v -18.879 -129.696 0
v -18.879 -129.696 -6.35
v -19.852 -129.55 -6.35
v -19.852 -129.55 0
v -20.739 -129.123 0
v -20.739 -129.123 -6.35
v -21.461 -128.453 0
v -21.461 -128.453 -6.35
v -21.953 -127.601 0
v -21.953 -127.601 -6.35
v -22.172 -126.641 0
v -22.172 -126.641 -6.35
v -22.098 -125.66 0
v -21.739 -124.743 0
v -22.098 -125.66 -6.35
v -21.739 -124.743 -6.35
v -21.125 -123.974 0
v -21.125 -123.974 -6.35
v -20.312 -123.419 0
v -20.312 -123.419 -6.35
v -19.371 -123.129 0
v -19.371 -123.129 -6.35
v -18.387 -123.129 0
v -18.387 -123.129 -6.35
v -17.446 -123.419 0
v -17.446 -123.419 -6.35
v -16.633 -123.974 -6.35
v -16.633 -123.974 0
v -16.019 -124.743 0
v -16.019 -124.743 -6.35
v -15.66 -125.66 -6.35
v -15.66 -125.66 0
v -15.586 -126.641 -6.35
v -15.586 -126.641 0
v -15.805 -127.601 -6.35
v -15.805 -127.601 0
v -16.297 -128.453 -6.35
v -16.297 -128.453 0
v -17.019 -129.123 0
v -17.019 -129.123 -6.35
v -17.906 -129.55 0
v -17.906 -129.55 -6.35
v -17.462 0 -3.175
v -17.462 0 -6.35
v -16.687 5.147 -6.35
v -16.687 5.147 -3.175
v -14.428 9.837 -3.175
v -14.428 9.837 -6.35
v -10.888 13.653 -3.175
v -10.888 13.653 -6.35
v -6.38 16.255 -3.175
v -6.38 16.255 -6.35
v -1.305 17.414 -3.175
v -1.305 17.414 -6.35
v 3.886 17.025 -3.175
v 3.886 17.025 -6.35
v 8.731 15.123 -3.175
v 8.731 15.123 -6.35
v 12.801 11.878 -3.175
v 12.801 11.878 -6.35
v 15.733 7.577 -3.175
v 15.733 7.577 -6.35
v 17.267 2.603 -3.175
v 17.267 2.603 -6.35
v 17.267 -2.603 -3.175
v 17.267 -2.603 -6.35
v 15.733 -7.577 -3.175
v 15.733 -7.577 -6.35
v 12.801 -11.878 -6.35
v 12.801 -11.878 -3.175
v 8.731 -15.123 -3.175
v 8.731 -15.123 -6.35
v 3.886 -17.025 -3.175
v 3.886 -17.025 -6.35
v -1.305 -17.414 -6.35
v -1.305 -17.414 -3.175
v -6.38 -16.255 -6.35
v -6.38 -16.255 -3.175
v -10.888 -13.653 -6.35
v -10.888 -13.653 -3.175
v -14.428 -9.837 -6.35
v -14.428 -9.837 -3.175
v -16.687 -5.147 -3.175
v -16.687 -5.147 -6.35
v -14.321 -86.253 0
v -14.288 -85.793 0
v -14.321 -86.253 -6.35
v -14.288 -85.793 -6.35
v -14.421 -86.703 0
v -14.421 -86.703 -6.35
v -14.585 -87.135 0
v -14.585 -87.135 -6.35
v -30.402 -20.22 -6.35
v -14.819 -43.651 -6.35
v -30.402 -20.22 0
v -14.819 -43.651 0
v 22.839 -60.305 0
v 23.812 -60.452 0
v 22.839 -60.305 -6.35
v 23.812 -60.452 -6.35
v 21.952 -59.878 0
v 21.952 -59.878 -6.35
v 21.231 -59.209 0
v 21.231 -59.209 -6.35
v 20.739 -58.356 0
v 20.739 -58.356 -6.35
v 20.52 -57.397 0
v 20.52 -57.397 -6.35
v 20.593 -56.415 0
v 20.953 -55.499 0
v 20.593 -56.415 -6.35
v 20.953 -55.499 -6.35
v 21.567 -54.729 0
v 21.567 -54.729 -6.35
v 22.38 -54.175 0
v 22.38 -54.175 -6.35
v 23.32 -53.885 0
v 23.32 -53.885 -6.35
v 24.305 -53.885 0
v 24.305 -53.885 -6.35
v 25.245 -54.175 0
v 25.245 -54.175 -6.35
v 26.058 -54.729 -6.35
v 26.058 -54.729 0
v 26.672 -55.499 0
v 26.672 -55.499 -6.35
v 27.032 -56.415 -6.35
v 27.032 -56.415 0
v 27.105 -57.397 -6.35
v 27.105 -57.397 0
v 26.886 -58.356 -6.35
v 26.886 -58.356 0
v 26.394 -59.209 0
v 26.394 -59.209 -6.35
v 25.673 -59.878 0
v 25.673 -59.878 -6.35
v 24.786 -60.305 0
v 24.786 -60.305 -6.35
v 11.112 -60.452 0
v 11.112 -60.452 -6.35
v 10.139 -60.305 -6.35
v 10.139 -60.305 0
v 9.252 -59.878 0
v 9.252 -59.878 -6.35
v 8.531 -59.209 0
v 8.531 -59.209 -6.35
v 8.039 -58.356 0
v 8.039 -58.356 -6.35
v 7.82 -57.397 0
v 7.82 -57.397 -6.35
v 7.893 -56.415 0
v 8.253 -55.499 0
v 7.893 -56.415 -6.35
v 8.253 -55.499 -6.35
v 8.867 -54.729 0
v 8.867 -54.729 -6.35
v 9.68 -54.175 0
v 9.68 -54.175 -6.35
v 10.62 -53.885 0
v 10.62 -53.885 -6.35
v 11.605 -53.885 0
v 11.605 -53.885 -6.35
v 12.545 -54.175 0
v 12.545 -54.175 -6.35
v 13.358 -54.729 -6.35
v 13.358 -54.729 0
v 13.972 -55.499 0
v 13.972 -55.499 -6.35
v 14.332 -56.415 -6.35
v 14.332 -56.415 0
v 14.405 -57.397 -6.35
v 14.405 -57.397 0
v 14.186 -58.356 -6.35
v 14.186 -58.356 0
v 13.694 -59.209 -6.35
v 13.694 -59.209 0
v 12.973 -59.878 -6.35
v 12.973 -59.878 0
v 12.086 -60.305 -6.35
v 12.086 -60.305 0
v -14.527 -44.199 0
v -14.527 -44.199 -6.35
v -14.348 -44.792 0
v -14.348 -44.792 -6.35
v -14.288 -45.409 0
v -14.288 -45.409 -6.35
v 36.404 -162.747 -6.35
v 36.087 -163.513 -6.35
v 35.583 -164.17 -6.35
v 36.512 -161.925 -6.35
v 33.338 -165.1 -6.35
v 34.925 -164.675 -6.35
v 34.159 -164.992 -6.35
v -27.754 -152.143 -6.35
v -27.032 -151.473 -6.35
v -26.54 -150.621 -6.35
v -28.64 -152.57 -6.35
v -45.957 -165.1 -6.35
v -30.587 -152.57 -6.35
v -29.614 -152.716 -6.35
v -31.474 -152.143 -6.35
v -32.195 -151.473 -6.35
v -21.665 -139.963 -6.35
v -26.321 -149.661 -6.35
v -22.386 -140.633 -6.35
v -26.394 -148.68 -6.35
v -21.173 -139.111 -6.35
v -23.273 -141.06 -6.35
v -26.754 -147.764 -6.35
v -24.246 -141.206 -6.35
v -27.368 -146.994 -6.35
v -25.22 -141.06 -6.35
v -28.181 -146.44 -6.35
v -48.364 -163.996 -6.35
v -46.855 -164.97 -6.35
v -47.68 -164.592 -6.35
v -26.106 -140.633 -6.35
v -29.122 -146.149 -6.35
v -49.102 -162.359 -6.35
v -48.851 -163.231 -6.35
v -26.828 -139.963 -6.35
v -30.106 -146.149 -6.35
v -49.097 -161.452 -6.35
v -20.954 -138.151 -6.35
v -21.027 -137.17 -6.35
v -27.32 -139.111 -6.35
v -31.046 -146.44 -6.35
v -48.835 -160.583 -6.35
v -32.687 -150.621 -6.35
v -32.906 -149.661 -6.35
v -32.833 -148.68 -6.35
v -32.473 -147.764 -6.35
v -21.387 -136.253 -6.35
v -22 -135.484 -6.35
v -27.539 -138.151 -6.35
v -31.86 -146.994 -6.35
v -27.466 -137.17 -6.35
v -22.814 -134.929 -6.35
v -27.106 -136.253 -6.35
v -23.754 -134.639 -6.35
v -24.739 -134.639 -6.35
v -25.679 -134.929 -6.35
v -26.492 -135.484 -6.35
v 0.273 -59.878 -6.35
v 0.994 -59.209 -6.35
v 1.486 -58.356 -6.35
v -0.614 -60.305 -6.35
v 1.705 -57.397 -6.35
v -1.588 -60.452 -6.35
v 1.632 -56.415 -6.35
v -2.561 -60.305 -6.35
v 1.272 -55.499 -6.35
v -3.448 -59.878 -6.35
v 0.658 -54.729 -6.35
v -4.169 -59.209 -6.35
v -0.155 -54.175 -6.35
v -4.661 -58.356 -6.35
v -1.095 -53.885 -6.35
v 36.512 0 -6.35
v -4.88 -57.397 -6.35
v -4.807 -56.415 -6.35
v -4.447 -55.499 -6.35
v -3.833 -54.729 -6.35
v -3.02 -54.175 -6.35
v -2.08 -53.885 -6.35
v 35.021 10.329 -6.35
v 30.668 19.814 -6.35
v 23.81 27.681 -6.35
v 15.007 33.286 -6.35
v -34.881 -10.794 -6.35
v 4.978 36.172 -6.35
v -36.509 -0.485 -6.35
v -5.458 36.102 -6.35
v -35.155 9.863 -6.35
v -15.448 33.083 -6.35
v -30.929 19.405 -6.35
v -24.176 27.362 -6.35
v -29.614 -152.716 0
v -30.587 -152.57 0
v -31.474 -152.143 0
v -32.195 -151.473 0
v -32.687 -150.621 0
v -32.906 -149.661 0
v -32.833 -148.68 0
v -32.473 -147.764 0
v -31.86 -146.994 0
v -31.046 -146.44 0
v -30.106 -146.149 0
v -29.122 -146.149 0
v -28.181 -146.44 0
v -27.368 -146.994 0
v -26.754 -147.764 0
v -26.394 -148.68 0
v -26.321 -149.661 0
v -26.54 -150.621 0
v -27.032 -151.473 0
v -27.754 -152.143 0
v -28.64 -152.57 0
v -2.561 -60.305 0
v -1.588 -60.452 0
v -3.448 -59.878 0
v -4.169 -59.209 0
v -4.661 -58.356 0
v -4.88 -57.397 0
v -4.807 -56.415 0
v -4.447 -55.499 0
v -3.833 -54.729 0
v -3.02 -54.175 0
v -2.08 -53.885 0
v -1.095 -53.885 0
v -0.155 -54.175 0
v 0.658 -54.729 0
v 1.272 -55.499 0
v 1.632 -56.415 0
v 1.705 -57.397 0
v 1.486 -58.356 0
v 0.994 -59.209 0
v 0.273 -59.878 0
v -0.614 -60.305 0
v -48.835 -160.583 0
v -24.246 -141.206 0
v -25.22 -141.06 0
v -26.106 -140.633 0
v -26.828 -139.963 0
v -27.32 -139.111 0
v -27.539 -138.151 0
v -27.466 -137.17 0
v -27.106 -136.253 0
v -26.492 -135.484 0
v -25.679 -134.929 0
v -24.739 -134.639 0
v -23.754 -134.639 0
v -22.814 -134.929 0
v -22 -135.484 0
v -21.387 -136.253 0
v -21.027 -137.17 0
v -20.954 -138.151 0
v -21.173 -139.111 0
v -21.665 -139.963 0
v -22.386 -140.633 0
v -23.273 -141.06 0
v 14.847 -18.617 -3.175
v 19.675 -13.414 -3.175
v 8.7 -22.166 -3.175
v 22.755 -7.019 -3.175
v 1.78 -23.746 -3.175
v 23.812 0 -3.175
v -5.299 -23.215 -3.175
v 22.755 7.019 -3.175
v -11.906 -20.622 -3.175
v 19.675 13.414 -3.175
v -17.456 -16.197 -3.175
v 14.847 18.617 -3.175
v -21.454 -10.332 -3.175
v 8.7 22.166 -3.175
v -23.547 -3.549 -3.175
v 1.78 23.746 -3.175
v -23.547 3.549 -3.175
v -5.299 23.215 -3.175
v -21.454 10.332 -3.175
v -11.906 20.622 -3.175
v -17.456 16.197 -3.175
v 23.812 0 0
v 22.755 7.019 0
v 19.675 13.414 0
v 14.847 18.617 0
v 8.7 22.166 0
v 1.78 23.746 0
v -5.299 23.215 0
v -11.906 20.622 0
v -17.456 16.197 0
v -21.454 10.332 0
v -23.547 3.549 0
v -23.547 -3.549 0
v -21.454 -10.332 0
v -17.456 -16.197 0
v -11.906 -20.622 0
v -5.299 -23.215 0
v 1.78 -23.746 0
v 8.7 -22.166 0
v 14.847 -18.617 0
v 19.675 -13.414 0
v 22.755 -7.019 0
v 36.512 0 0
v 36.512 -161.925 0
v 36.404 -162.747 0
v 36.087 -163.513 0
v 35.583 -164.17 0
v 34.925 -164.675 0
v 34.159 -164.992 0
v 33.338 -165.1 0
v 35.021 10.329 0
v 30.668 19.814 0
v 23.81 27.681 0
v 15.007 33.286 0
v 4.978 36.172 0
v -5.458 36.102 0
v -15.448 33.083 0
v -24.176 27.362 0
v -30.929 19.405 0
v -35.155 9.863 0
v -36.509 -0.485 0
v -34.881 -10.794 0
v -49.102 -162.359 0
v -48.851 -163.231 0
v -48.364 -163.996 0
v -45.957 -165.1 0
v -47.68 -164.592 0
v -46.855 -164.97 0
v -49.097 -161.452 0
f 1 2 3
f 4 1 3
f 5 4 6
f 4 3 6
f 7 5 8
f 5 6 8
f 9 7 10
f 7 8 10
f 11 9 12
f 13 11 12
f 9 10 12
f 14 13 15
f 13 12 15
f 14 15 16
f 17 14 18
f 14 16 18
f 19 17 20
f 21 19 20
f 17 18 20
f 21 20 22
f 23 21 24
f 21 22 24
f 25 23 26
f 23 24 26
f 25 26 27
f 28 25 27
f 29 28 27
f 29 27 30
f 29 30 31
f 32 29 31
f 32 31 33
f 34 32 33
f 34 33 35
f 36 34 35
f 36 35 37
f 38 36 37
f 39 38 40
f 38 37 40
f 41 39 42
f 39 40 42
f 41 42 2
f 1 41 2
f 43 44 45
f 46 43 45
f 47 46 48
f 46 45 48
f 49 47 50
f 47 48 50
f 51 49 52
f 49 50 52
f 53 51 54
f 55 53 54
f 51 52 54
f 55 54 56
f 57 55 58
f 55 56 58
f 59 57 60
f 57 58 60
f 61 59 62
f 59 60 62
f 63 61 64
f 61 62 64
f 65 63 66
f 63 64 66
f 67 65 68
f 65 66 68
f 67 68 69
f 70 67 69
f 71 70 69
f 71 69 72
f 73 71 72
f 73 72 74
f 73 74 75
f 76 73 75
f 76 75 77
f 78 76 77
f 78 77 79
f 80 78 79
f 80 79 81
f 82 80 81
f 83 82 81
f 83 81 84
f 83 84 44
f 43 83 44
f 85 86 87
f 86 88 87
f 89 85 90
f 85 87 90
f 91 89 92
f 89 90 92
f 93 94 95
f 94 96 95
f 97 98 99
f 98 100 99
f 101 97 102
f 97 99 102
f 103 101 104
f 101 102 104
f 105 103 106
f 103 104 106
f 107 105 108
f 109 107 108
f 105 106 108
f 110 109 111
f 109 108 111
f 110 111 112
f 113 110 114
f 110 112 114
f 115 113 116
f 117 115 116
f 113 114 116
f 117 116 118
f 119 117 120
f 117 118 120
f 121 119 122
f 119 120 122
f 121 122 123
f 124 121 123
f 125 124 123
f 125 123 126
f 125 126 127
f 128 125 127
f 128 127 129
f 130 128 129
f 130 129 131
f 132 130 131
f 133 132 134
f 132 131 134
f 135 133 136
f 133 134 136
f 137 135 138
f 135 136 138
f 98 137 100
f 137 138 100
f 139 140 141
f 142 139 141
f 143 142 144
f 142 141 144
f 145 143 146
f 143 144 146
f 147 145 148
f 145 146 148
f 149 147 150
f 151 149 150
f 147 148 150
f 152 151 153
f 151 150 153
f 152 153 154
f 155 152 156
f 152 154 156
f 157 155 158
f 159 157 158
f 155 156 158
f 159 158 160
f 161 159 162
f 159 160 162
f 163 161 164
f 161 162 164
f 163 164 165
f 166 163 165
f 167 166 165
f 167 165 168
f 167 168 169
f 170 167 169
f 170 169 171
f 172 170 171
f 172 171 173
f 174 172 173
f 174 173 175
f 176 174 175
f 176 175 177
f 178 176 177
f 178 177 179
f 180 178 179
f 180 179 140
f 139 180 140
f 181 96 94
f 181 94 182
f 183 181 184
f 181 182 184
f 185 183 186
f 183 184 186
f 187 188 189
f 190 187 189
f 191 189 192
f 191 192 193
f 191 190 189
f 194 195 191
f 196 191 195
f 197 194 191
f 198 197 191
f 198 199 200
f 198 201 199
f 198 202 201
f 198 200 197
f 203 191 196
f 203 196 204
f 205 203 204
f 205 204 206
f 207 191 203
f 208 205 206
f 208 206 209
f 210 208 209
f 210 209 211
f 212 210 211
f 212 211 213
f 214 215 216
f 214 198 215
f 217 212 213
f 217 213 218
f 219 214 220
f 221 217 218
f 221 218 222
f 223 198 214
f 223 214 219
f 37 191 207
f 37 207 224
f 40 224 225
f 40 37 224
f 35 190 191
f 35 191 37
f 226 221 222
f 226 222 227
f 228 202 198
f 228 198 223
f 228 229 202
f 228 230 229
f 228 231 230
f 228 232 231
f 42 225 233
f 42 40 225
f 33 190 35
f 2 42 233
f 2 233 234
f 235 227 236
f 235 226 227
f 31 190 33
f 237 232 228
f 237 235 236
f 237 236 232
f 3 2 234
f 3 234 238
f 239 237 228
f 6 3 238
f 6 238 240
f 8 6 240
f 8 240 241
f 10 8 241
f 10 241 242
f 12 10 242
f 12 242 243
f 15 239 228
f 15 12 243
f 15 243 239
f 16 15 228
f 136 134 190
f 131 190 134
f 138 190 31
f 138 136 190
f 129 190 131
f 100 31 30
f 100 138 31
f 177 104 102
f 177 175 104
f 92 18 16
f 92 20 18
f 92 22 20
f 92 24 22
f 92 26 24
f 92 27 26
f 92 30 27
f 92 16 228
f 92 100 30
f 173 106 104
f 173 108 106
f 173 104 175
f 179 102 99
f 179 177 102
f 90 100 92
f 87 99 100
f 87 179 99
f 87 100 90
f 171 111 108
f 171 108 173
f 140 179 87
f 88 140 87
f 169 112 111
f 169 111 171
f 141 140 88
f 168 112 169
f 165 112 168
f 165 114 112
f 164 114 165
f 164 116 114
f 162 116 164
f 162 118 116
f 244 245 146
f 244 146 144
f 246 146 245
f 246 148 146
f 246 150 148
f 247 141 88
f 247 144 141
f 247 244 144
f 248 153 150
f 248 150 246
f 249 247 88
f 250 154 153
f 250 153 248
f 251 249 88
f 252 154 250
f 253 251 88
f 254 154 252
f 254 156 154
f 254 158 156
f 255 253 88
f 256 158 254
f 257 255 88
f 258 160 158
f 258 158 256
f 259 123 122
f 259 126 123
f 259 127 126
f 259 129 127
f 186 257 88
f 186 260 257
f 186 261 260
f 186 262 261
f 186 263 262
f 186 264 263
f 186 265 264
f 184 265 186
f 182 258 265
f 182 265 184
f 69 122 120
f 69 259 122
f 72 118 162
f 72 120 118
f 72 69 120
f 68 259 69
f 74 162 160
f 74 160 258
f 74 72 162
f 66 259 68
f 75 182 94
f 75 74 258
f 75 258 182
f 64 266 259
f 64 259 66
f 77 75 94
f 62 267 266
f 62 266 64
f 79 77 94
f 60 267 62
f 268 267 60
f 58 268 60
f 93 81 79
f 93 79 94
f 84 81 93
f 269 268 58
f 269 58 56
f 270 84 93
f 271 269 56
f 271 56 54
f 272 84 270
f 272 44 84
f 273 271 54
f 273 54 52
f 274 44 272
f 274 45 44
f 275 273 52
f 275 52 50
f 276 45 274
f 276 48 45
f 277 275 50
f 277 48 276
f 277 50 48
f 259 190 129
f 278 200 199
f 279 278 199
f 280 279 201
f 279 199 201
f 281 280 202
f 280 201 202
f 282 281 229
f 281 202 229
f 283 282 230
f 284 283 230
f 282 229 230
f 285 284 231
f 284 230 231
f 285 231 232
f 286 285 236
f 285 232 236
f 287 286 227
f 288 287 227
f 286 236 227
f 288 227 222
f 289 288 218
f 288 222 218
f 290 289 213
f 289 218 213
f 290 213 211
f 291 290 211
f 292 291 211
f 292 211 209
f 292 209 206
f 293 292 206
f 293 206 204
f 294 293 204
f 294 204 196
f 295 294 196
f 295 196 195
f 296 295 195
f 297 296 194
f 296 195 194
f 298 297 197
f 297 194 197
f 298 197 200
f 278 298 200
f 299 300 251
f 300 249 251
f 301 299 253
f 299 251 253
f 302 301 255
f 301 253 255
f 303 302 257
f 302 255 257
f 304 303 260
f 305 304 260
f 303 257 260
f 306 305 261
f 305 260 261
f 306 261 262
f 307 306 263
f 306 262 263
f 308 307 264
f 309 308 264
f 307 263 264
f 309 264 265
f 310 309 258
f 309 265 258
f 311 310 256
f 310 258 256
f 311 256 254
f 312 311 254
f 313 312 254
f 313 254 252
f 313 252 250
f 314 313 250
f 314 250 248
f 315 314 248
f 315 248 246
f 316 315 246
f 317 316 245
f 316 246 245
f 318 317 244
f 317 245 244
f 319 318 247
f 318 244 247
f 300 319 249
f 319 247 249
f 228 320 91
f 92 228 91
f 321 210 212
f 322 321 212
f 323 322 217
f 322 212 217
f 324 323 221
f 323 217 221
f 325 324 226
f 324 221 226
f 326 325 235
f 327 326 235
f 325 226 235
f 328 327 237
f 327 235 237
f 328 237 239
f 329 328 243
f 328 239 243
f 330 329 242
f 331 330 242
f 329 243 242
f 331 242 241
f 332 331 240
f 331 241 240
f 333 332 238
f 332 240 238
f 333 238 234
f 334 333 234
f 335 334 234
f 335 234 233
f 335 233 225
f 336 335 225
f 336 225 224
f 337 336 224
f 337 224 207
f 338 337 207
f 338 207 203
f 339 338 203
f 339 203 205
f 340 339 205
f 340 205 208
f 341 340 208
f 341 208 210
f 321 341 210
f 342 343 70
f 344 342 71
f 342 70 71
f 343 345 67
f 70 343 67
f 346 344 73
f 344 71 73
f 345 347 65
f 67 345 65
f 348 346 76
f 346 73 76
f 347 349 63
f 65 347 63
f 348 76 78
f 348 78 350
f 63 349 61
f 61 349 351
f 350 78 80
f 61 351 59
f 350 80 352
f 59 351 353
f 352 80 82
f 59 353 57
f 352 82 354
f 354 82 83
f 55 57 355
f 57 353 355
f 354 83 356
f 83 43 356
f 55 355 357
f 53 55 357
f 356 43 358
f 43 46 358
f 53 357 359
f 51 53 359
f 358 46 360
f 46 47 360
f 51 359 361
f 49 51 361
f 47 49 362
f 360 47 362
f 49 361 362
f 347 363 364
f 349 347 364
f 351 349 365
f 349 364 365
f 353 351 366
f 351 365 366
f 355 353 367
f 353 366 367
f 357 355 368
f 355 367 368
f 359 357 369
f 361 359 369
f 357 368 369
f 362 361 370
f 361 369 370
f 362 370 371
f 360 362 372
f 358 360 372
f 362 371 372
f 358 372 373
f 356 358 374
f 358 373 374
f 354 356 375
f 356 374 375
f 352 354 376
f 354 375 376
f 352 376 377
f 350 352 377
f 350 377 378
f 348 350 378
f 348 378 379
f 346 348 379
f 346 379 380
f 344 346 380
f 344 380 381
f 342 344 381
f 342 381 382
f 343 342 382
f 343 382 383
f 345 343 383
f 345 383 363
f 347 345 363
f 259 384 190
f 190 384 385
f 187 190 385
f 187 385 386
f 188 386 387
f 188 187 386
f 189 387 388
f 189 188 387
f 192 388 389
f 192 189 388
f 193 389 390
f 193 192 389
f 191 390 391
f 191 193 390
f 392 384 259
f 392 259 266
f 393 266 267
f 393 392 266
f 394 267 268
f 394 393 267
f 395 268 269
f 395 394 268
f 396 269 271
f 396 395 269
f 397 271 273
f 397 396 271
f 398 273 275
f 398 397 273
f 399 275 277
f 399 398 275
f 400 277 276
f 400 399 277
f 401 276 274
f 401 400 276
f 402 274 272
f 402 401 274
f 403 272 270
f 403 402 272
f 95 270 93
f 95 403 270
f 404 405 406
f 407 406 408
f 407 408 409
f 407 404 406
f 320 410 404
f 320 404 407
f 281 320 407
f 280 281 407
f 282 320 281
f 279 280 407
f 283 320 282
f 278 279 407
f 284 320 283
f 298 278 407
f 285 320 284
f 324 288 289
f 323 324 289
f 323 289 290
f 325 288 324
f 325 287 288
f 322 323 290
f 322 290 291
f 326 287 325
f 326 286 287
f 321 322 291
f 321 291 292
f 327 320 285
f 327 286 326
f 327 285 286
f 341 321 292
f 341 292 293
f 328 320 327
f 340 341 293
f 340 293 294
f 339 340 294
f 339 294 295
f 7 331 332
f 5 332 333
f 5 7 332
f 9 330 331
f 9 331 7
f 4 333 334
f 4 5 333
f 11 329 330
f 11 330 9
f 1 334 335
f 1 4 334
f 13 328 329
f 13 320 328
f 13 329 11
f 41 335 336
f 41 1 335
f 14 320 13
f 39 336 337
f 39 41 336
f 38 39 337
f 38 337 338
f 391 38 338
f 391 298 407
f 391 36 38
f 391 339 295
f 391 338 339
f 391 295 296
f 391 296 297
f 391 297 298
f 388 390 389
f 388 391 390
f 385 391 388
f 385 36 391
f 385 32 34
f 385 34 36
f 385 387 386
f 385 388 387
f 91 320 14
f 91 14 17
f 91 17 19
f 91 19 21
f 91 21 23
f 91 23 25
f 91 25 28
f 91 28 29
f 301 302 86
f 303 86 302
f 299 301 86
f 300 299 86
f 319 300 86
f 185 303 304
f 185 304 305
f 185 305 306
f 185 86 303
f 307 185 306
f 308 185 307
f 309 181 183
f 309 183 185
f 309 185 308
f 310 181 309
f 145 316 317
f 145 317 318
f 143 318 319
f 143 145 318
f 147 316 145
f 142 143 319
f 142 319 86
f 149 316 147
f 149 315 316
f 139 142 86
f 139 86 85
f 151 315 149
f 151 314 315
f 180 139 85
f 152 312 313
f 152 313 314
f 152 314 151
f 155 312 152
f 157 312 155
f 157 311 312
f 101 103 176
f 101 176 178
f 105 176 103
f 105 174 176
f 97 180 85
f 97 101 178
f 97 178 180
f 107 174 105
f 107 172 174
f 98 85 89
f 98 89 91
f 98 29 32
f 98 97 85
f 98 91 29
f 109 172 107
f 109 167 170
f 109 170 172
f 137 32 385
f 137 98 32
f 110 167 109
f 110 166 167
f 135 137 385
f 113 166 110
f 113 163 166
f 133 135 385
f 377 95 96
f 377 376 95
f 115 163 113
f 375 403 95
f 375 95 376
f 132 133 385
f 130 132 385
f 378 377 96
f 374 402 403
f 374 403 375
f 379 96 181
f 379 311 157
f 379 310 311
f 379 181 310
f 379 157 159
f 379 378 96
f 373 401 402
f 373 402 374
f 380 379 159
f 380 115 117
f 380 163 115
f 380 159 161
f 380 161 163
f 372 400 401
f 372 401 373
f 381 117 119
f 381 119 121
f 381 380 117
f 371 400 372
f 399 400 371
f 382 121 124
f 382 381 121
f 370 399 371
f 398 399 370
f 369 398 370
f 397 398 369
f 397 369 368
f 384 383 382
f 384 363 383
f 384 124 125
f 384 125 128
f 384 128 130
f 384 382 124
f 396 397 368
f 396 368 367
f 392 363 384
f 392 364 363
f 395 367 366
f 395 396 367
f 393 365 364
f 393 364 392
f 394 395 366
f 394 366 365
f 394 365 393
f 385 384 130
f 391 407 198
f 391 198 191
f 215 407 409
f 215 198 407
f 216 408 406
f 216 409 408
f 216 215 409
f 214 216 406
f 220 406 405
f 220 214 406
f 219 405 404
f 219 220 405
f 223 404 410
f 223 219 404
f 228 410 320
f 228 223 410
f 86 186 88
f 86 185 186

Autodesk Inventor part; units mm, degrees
ref_plane "YZ Plane" through (0, 0, 0) normal (1, 0, 0) x (0, 1, 0)
ref_plane "XZ Plane" through (0, 0, 0) normal (0, 1, 0) x (-1, 0, 0)
ref_plane "XY Plane" through (0, 0, 0) normal (0, 0, 1) x (1, 0, 0)
sketch "Sketch1" plane through (0, 0, 0) normal (0, 0, 1) x (1, 0, 0)
  circle A0 centre (0, 0) radius 23.8125
  circle A1 centre (0, 0) radius 36.5125
  line L0 (36.5125, -165.1) -> (-14.2875, -165.1) construction
  line L1 (36.5125, 0) -> (36.5125, -165.1)
  line L2 (-36.1762, -4.9442) -> (-14.2875, -165.1) construction
  line L3 (36.5125, -44.45) -> (-14.2875, -44.45) construction
  line L4 (-14.2875, -44.45) -> (-14.2875, -431.8) construction
  line L5 (-14.2875, -431.8) -> (36.5125, -431.8) construction
  line L6 (36.5125, -431.8) -> (36.5125, -44.45) construction
  line L7 (8.7327, -97.2312) -> (-152.2848, -442.5345) construction
  line L8 (-152.2848, -442.5345) -> (-175.3051, -431.8) construction
  line L9 (-175.3051, -431.8) -> (-14.2875, -86.4967) construction
  line L10 (-14.2875, -86.4967) -> (8.7327, -97.2312) construction
  line L11 (36.5125, -431.8) -> (11.1125, -431.8) construction
  line L12 (11.1125, -431.8) -> (11.1125, -501.65) construction
  line L13 (11.1125, -501.65) -> (36.5125, -501.65) construction
  line L14 (36.5125, -501.65) -> (36.5125, -431.8) construction
  line L15 (-150.8125, -431.8) -> (-150.8125, -501.65) construction
  line L16 (-2.7774, -91.864) -> (-19.4192, -127.5524) construction
  line L17 (-36.3765, 3.1489) -> (-36.3765, -165.1) construction
  line L18 (-50.9408, -165.1) -> (36.5125, -165.1)
  line L19 (-50.9408, -165.1) -> (-36.3765, 3.1489)
  line L20 (-50.9408, -165.1) -> (-14.2875, -86.4967)
  line L21 (-14.2875, -44.45) -> (-14.2875, -86.4967)
  line L22 (-14.2875, -44.45) -> (-30.4024, -20.2202)
  point P0 (23.8125, -431.8)
  point P1 (-8.1446, -103.3741)
  point P2 (23.8125, -57.15)
  point P3 (11.1125, -57.15)
  point P4 (-1.5875, -57.15)
  point P5 (11.1125, -44.45)
  point P6 (-13.5119, -114.8842)
  point P7 (-18.8791, -126.3943)
  point P8 (-24.2464, -137.9044)
  point P9 (-29.6137, -149.4145)
  dimension "d0" = 47.625
  dimension "d1" = 12.7
  dimension "d2" = 50.8
  dimension "d3" = 165.1
  dimension "d4" = 50.8
  dimension "d5" = 387.35
  dimension "d6" = 25.4
  dimension "d7" = 25
  dimension "d8" = 381
  dimension "d10" = 25.4
  dimension "d11" = 69.85
  dimension "d13" = 431.8
  dimension "d15" = 187.325
  dimension "d17" = 12.7
  dimension "d18" = 12.7
  dimension "d19" = 12.7
  dimension "d20" = 12.7
  dimension "d23" = 12.7
extrude "Extrusion1" add sketch "Sketch1" against normal blind 6.35 contours A1 | L1 L18 L20 L21 L22 A1
hole "Hole1" at (23.8125, -57.15, 0) at (11.1125, -57.15, 0) at (-1.5875, -57.15, 0) at (-18.8791, -126.3943, 0) at (-24.2464, -137.9044, 0) at (-29.6137, -149.4145, 0) direction (0, 0, -1) diameter 6.604 end through all
sketch "Sketch2" plane through (0, 0, -6.35) normal (0, 0, -1) x (-1, 0, 0)
  circle A0 centre (0, 0) radius 23.8125 projected
  circle A1 centre (0, 0) radius 17.4625
  dimension "d37" = 6.35
extrude "Extrusion2" add sketch "Sketch2" against normal blind 3.175
sketch "Sketch3" plane through (0, 0, 0) normal (0, 0, 1) x (1, 0, 0)
  circle A0 centre (-24.2464, -137.9044) radius 3.302 construction
  circle A1 centre (-1.5875, -57.15) radius 3.302 construction
  circle A2 centre (23.8125, -57.15) radius 3.302 construction
  circle A3 centre (11.1125, -57.15) radius 3.302 construction
  circle A4 centre (-18.8791, -126.3943) radius 3.302 construction
  circle A5 centre (-29.6137, -149.4145) radius 3.302 construction
  circle A6 centre (0, 0) radius 23.8125 construction
  line L0 (36.5125, 0) -> (36.5125, -165.1) construction
  line L1 (36.5125, -165.1) -> (-50.9408, -165.1) construction
  circle A7 centre (-24.2464, -137.9044) radius 3.302 construction
  circle A8 centre (-1.5875, -57.15) radius 3.302 construction
  circle A9 centre (23.8125, -57.15) radius 3.302 construction
  circle A10 centre (11.1125, -57.15) radius 3.302 construction
  circle A11 centre (-18.8791, -126.3943) radius 3.302 construction
  circle A12 centre (-29.6137, -149.4145) radius 3.302 construction
  circle A13 centre (0, 0) radius 23.8125 construction
  line L2 (36.5125, 0) -> (36.5125, -165.1) construction
  line L3 (36.5125, -165.1) -> (-50.9408, -165.1) construction
  line L4 (-175.3051, -431.8) -> (-14.2875, -86.4967) construction
  line L5 (8.7327, -97.2312) -> (-152.2848, -442.5345) construction
  line L6 (-14.2875, -44.45) -> (-14.2875, -431.8) construction
  line L7 (-14.2875, -86.4967) -> (-14.2875, -44.45) projected
  line L8 (-14.2875, -44.45) -> (-30.4024, -20.2202) projected
  arc A14 (36.5125, 0) -> (-30.4024, -20.2202) centre (0, 0) ccw projected
  line L9 (-50.9408, -165.1) -> (-14.2875, -86.4967) projected
  line L10 (-14.2875, -86.4967) -> (-14.2875, -44.45) projected
  line L11 (-14.2875, -44.45) -> (-30.4024, -20.2202) projected
  arc A15 (36.5125, 0) -> (-30.4024, -20.2202) centre (0, 0) ccw projected
  line L12 (-50.9408, -165.1) -> (-14.2875, -86.4967) projected
fillet "Fillet1" radius 3.175 4 edges at (-14.2875, -44.45, -3.175) (-14.2875, -86.4967, -3.175) (-50.9408, -165.1, -3.175) (36.5125, -165.1, -3.175)
equation "\"d20\" = d19"
properties part number "CL7-007" material "Aluminum 6061"
